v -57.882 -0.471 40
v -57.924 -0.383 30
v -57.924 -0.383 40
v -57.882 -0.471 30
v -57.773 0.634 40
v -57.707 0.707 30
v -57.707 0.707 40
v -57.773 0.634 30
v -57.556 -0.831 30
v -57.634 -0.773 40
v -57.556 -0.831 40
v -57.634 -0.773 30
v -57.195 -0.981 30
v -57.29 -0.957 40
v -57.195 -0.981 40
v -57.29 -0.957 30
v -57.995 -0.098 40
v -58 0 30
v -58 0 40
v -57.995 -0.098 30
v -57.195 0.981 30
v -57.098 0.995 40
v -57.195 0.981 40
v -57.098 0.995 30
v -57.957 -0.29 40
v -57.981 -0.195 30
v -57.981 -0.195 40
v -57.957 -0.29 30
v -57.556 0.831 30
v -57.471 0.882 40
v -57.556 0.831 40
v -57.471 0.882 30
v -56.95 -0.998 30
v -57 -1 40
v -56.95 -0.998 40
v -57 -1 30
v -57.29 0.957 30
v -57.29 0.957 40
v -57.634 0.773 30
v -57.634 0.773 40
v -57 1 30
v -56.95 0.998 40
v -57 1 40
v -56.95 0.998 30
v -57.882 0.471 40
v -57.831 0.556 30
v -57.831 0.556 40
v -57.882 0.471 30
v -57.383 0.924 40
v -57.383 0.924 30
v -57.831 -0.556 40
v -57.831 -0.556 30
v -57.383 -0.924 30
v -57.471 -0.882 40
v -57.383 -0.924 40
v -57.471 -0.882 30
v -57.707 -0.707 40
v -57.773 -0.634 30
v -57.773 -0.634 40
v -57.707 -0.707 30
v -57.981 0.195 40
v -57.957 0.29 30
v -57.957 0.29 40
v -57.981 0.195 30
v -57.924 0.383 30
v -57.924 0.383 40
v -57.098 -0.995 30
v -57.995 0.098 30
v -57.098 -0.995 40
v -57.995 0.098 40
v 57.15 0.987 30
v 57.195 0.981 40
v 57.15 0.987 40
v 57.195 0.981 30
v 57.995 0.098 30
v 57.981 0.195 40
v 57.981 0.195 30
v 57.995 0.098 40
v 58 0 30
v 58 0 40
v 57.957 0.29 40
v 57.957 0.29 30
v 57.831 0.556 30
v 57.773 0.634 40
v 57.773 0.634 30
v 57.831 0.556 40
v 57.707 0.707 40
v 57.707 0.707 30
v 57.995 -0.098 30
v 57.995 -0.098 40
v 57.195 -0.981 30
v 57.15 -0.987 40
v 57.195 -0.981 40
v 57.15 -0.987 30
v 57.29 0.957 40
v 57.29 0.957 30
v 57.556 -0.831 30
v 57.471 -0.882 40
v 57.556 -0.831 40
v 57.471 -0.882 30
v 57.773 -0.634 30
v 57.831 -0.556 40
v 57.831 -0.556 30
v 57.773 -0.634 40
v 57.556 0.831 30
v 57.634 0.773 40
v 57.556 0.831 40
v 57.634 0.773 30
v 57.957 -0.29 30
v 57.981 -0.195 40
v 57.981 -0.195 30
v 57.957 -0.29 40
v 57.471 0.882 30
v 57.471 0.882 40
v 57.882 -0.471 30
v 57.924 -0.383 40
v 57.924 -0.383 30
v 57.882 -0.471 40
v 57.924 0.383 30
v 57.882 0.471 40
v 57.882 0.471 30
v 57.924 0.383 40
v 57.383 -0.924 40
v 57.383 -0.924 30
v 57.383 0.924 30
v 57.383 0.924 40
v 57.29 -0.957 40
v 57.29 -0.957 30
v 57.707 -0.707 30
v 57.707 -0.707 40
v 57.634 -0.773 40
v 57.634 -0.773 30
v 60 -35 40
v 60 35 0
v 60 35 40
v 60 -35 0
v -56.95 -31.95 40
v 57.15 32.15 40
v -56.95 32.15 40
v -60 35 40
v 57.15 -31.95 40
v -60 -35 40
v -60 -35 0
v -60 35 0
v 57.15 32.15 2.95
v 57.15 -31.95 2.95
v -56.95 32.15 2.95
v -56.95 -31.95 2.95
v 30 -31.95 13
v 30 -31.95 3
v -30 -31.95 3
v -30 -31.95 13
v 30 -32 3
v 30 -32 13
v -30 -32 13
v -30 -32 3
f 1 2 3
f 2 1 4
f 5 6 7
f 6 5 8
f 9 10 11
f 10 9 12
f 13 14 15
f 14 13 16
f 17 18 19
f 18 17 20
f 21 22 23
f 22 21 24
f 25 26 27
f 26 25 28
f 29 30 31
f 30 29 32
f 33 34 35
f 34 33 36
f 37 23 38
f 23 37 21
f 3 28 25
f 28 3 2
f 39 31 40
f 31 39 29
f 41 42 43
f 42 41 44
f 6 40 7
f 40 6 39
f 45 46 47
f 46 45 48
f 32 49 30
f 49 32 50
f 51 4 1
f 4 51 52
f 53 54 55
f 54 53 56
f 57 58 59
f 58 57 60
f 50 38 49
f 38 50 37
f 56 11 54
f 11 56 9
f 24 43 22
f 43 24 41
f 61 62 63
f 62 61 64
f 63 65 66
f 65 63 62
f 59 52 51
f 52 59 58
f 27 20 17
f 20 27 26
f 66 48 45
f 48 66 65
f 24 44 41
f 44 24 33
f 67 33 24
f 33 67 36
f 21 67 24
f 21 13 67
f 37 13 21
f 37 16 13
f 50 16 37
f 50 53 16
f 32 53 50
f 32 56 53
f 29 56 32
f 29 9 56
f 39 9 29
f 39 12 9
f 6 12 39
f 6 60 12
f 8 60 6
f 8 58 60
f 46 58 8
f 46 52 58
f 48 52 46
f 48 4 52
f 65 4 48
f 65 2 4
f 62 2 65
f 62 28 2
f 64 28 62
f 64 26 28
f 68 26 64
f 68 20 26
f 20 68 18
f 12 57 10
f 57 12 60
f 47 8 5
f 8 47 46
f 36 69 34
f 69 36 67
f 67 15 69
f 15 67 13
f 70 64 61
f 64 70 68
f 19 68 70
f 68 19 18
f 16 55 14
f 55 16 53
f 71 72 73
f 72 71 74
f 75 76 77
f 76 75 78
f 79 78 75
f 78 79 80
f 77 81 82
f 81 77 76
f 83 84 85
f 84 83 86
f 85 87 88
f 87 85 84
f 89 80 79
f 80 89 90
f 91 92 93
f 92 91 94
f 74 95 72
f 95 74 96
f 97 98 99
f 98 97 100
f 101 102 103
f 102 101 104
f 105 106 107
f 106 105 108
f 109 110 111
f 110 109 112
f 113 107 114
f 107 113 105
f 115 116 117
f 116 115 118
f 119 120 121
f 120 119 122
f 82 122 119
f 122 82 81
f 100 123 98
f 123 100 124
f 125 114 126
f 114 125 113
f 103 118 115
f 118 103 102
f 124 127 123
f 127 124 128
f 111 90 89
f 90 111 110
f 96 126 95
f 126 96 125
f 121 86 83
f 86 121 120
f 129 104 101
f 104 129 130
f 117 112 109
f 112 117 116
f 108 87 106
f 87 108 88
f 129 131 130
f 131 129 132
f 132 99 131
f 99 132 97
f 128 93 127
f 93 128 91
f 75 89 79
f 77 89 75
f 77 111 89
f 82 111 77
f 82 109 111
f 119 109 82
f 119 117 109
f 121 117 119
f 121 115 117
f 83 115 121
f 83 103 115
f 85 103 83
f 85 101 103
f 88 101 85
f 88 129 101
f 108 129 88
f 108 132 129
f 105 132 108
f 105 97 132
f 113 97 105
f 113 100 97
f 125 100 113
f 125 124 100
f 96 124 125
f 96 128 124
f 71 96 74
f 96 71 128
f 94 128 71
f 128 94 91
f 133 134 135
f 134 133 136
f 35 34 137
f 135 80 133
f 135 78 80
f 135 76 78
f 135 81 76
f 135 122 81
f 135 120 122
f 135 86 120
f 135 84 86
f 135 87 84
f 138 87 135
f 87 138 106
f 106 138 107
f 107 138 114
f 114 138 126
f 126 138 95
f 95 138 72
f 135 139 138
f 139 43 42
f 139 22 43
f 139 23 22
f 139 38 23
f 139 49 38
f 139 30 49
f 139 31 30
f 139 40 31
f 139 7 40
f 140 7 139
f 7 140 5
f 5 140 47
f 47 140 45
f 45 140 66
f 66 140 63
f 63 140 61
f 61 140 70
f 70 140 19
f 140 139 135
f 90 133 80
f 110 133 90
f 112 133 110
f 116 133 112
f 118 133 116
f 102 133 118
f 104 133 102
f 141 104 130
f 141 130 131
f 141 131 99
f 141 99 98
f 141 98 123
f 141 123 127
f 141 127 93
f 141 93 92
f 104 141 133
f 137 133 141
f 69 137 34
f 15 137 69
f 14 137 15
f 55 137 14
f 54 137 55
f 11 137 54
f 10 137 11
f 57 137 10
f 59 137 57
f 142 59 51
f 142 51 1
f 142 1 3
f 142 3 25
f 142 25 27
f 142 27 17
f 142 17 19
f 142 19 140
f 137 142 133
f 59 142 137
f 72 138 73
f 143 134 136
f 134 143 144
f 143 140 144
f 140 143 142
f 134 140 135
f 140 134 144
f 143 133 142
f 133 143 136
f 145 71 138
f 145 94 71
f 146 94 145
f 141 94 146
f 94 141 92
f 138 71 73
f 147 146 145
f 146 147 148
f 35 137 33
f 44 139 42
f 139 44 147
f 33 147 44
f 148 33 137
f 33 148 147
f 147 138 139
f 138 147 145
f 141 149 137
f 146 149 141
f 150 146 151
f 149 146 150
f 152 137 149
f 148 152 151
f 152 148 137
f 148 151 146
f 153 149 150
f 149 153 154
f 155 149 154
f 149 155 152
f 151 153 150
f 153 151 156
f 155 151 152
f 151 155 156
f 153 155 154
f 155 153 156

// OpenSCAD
// Mini horizontal gel-electrophoresis buffer tank.
// Outer dimensions: 120 (X) x 70 (Y) x 40 (Z).
// Wall thickness: 3 mm. Floor thickness: 3 mm.
// Inner floor Z = 3 mm.
// Central platform: 60 mm long (X), full inner width (Y), top at Z = 13 mm.
// Electrode holes: 2 mm diameter, horizontal along X, at Y=0, Z=30.

$fn = 64;

// Outer dimensions
X_out = 120;
Y_out = 70;
Z_out = 40;

// Thicknesses
wall_t = 3;
floor_t = 3;

// Inner dimensions
X_in  = X_out - 2 * wall_t; // 114
Y_in  = Y_out - 2 * wall_t; // 64
Z_in  = Z_out - floor_t;    // 37

// Platform dimensions
plat_len = 60;
plat_w   = Y_in;
plat_top = 13; // Absolute Z height of top surface

// Electrode hole parameters
hole_d = 2;
hole_y = 0;
hole_z = 30;

difference() {
    // 1. The solid outer block
    translate([-X_out/2, -Y_out/2, 0]) 
        cube([X_out, Y_out, Z_out]);

    // 2. The inner void (subtracted)
    // This represents the empty space inside the tank.
    // The void starts at the inner floor (Z = floor_t) and goes to the top (Z = Z_out).
    // The void X range is [wall_t, X_out - wall_t].
    // The void Y range is [wall_t, Y_out - wall_t].
    
    // We extend the void slightly past the inner faces to ensure clean cuts.
    void_x = X_in + 0.1;
    void_y = Y_in + 0.1;
    void_z = Z_out - floor_t + 0.1; // Extend slightly above the top of the void
    
    // Position the void:
    // X start: wall_t
    // Y start: wall_t
    // Z start: floor_t
    translate([-X_out/2 + wall_t + 0.05, -Y_out/2 + wall_t + 0.05, floor_t - 0.05])
        cube([void_x, void_y, void_z]);
    
    // 3. The central platform
    // It sits on the inner floor.
    // Bottom Z = floor_t = 3.
    // Top Z = 13.
    // Length = 60, centered in X.
    // Width = Y_in.
    
    translate([-plat_len/2, -plat_w/2, floor_t])
        cube([plat_len, plat_w, plat_top - floor_t]);
    
    // 4. Electrode holes
    // Two holes, one at each end (X = +/- X_in/2).
    // Hole is a cylinder along X axis.
    // Position: Y = 0, Z = 30.
    // Radius = hole_d / 2.
    // We extend the hole slightly past the tank length to ensure clean cuts.
    
    for (side = [-1, 1]) {
        translate([side * (X_in / 2), hole_y, hole_z])
            cylinder(h = X_in + 0.1, d = hole_d);
    }
}
